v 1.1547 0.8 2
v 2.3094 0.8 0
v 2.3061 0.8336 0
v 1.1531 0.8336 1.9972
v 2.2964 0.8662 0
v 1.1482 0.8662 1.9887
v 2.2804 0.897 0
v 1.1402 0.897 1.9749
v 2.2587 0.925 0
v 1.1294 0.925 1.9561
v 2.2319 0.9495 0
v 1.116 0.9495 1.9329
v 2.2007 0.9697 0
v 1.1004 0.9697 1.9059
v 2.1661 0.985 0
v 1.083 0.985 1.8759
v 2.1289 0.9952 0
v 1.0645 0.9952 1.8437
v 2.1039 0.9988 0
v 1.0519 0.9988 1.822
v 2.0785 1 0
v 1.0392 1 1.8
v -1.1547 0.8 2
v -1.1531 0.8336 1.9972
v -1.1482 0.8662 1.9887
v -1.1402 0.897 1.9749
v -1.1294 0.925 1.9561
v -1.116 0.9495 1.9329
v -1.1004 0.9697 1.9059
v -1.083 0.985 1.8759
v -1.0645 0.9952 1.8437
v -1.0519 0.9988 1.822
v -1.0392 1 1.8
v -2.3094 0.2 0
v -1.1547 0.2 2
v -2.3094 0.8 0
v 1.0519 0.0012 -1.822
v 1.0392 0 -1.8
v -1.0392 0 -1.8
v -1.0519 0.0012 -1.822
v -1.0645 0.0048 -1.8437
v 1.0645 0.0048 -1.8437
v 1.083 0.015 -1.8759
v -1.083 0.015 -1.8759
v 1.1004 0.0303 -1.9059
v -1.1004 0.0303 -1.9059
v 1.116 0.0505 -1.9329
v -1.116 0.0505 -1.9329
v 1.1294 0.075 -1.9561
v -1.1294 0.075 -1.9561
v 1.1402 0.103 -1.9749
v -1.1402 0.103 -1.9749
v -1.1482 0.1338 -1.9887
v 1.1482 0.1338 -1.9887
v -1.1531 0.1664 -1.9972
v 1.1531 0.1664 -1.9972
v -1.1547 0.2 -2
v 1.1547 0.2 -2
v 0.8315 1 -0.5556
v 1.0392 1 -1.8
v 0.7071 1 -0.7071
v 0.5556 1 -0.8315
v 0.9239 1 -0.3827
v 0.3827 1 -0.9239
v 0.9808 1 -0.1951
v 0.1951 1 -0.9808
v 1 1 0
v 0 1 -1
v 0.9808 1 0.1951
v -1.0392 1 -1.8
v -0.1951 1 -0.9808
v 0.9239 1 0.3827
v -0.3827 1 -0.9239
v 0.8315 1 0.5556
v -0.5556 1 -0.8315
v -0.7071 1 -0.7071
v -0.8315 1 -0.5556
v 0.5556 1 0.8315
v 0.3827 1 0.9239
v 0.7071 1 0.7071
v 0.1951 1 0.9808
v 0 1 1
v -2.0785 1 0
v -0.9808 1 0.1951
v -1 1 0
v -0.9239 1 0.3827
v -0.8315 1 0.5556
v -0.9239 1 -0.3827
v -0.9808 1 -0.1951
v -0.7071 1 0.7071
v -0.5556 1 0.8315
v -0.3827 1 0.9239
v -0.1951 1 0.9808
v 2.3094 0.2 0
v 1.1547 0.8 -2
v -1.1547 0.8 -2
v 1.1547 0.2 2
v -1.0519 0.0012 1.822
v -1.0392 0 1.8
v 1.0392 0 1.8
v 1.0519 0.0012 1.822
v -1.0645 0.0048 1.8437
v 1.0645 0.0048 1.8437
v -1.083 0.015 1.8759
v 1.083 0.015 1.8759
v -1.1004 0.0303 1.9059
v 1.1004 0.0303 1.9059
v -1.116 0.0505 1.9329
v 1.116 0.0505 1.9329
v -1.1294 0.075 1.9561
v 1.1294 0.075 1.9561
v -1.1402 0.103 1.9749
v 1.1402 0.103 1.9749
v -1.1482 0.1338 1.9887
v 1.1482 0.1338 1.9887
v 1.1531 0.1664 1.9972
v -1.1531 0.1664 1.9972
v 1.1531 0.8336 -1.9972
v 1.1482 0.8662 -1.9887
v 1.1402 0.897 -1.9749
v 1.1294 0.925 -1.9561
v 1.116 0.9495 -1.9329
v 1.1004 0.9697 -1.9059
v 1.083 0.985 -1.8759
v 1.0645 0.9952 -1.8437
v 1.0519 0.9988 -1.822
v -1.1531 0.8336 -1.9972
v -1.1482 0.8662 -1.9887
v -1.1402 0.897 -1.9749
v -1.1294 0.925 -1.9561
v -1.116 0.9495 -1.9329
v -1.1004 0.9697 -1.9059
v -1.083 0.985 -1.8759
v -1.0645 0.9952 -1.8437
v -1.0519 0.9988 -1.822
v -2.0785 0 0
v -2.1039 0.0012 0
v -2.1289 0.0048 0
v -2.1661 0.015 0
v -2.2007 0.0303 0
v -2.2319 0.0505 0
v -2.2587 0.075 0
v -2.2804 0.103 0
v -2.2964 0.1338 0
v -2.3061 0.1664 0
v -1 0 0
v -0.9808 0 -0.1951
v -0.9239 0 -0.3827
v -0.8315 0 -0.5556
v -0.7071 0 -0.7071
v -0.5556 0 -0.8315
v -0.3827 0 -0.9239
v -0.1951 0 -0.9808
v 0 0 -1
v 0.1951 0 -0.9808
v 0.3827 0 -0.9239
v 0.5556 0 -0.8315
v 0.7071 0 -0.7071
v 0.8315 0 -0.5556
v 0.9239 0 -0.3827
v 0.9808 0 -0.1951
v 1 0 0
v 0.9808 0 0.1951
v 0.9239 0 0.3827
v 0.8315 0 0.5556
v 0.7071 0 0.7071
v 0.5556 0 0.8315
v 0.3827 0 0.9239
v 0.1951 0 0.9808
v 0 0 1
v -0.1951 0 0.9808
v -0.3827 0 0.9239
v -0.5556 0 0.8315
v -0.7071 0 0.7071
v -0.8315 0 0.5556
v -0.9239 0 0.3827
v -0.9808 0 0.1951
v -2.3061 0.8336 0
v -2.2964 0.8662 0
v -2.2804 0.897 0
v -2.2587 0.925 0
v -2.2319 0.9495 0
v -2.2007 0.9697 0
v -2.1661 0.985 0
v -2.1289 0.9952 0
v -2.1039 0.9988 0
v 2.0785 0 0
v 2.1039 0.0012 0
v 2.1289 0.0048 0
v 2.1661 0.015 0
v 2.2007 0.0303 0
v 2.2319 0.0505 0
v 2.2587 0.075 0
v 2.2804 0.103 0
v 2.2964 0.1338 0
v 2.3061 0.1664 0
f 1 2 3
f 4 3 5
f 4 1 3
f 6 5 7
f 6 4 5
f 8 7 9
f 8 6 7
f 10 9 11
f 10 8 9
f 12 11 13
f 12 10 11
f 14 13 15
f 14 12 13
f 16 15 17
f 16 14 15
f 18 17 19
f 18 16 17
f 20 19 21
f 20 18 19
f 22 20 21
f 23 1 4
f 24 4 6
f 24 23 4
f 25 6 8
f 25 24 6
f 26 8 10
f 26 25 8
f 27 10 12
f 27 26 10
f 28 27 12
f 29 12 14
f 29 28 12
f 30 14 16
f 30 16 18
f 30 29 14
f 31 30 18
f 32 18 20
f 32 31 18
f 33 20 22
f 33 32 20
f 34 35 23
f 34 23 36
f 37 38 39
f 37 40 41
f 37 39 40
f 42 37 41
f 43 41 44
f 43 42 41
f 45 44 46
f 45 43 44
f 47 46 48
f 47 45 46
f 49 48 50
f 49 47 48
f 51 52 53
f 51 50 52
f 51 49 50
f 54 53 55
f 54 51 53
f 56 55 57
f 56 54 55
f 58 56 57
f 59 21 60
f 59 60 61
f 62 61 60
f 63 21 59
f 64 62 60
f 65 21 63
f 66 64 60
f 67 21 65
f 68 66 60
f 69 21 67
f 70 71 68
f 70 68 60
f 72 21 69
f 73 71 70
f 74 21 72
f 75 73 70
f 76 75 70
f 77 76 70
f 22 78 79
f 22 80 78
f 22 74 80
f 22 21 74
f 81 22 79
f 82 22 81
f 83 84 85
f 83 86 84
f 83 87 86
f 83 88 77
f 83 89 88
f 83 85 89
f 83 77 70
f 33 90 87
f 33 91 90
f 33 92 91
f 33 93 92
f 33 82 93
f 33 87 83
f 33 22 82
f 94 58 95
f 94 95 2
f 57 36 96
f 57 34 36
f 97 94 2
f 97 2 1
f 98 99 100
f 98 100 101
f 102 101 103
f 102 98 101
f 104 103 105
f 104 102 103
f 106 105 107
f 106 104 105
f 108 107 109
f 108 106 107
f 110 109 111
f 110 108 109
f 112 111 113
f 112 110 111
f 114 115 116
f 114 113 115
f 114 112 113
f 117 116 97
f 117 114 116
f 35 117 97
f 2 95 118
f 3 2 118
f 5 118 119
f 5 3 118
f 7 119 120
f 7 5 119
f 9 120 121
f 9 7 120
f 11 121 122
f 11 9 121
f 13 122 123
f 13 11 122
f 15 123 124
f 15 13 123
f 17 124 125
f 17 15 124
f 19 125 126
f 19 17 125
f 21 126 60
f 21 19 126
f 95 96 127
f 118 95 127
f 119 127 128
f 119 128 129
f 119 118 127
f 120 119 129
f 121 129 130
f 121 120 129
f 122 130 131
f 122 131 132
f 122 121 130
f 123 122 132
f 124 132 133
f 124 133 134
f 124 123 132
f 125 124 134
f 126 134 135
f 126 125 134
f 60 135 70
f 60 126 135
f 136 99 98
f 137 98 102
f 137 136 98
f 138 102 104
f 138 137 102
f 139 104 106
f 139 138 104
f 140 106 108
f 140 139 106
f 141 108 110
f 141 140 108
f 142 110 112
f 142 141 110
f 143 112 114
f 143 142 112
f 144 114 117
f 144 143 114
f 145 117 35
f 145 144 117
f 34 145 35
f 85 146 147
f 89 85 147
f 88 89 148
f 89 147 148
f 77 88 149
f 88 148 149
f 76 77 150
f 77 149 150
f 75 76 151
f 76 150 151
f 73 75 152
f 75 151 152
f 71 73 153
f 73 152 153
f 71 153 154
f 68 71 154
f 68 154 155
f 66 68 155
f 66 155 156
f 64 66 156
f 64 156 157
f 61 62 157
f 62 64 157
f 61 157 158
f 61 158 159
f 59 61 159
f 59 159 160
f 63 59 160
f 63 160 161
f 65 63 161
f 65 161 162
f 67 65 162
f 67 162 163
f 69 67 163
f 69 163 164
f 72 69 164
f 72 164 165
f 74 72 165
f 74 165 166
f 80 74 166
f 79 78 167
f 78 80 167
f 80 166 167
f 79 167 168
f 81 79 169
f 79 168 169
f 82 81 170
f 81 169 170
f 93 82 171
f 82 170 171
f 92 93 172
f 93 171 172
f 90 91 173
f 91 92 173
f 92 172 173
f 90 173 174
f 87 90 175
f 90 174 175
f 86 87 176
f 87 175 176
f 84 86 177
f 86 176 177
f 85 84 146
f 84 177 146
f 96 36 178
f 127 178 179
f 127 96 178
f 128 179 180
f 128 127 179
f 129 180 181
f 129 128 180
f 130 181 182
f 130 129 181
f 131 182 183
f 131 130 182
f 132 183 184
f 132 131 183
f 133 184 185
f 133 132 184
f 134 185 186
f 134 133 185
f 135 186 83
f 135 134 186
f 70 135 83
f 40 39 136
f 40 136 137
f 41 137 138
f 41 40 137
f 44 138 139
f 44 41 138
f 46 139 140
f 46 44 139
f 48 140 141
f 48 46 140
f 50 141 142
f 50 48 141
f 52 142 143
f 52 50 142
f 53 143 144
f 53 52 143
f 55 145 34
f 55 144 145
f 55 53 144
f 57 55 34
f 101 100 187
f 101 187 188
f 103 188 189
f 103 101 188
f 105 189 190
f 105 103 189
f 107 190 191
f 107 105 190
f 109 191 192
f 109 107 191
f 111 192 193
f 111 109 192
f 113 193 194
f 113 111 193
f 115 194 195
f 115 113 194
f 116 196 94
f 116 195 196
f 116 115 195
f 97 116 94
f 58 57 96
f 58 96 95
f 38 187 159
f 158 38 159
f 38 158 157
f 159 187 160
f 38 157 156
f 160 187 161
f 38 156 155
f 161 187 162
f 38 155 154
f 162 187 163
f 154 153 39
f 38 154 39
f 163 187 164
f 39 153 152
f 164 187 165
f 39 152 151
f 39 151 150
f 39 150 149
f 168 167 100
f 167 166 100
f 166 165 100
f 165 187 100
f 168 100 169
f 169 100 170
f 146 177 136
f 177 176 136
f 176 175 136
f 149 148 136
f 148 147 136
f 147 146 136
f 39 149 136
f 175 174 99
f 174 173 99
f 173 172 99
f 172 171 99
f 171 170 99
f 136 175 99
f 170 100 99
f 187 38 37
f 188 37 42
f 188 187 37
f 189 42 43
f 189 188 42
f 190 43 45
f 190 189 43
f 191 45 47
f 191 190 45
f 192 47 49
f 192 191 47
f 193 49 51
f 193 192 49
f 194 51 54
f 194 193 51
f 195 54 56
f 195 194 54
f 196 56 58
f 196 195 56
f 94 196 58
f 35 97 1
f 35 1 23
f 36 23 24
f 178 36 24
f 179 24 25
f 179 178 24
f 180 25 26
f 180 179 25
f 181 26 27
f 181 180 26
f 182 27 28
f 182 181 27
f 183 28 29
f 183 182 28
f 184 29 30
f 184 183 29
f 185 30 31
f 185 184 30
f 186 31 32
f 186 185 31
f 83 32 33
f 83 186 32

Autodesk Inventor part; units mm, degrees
ref_plane "YZ Plane" through (0, 0, 0) normal (1, 0, 0) x (0, 1, 0)
ref_plane "XZ Plane" through (0, 0, 0) normal (0, 1, 0) x (-1, 0, 0)
ref_plane "XY Plane" through (0, 0, 0) normal (0, 0, 1) x (1, 0, 0)
sketch "Sketch1" plane through (0, 0, 0) normal (0, 1, 0) x (-1, 0, 0)
  line L0 (1.1547, 2) -> (2.3094, 0)
  line L1 (2.3094, 0) -> (1.1547, -2)
  line L2 (1.1547, -2) -> (-1.1547, -2)
  line L3 (-1.1547, -2) -> (-2.3094, 0)
  line L4 (-2.3094, 0) -> (-1.1547, 2)
  line L5 (-1.1547, 2) -> (1.1547, 2)
  circle A0 centre (0, 0) radius 1
  dimension "d0" = 4
  dimension "d1" = 2
extrude "Extrusion1" add sketch "Sketch1" along normal blind 1
fillet "Fillet1" radius 0.2 12 edges at (0, 1, 2) (-1.7321, 1, 1) (-1.7321, 1, -1) (0, 1, -2) (1.7321, 1, -1) (1.7321, 1, 1) (0, 0, 2) (1.7321, 0, 1) (1.7321, 0, -1) (0, 0, -2) (-1.7321, 0, -1) (-1.7321, 0, 1)
properties part number "m2_nut" material "Stainless Steel"
